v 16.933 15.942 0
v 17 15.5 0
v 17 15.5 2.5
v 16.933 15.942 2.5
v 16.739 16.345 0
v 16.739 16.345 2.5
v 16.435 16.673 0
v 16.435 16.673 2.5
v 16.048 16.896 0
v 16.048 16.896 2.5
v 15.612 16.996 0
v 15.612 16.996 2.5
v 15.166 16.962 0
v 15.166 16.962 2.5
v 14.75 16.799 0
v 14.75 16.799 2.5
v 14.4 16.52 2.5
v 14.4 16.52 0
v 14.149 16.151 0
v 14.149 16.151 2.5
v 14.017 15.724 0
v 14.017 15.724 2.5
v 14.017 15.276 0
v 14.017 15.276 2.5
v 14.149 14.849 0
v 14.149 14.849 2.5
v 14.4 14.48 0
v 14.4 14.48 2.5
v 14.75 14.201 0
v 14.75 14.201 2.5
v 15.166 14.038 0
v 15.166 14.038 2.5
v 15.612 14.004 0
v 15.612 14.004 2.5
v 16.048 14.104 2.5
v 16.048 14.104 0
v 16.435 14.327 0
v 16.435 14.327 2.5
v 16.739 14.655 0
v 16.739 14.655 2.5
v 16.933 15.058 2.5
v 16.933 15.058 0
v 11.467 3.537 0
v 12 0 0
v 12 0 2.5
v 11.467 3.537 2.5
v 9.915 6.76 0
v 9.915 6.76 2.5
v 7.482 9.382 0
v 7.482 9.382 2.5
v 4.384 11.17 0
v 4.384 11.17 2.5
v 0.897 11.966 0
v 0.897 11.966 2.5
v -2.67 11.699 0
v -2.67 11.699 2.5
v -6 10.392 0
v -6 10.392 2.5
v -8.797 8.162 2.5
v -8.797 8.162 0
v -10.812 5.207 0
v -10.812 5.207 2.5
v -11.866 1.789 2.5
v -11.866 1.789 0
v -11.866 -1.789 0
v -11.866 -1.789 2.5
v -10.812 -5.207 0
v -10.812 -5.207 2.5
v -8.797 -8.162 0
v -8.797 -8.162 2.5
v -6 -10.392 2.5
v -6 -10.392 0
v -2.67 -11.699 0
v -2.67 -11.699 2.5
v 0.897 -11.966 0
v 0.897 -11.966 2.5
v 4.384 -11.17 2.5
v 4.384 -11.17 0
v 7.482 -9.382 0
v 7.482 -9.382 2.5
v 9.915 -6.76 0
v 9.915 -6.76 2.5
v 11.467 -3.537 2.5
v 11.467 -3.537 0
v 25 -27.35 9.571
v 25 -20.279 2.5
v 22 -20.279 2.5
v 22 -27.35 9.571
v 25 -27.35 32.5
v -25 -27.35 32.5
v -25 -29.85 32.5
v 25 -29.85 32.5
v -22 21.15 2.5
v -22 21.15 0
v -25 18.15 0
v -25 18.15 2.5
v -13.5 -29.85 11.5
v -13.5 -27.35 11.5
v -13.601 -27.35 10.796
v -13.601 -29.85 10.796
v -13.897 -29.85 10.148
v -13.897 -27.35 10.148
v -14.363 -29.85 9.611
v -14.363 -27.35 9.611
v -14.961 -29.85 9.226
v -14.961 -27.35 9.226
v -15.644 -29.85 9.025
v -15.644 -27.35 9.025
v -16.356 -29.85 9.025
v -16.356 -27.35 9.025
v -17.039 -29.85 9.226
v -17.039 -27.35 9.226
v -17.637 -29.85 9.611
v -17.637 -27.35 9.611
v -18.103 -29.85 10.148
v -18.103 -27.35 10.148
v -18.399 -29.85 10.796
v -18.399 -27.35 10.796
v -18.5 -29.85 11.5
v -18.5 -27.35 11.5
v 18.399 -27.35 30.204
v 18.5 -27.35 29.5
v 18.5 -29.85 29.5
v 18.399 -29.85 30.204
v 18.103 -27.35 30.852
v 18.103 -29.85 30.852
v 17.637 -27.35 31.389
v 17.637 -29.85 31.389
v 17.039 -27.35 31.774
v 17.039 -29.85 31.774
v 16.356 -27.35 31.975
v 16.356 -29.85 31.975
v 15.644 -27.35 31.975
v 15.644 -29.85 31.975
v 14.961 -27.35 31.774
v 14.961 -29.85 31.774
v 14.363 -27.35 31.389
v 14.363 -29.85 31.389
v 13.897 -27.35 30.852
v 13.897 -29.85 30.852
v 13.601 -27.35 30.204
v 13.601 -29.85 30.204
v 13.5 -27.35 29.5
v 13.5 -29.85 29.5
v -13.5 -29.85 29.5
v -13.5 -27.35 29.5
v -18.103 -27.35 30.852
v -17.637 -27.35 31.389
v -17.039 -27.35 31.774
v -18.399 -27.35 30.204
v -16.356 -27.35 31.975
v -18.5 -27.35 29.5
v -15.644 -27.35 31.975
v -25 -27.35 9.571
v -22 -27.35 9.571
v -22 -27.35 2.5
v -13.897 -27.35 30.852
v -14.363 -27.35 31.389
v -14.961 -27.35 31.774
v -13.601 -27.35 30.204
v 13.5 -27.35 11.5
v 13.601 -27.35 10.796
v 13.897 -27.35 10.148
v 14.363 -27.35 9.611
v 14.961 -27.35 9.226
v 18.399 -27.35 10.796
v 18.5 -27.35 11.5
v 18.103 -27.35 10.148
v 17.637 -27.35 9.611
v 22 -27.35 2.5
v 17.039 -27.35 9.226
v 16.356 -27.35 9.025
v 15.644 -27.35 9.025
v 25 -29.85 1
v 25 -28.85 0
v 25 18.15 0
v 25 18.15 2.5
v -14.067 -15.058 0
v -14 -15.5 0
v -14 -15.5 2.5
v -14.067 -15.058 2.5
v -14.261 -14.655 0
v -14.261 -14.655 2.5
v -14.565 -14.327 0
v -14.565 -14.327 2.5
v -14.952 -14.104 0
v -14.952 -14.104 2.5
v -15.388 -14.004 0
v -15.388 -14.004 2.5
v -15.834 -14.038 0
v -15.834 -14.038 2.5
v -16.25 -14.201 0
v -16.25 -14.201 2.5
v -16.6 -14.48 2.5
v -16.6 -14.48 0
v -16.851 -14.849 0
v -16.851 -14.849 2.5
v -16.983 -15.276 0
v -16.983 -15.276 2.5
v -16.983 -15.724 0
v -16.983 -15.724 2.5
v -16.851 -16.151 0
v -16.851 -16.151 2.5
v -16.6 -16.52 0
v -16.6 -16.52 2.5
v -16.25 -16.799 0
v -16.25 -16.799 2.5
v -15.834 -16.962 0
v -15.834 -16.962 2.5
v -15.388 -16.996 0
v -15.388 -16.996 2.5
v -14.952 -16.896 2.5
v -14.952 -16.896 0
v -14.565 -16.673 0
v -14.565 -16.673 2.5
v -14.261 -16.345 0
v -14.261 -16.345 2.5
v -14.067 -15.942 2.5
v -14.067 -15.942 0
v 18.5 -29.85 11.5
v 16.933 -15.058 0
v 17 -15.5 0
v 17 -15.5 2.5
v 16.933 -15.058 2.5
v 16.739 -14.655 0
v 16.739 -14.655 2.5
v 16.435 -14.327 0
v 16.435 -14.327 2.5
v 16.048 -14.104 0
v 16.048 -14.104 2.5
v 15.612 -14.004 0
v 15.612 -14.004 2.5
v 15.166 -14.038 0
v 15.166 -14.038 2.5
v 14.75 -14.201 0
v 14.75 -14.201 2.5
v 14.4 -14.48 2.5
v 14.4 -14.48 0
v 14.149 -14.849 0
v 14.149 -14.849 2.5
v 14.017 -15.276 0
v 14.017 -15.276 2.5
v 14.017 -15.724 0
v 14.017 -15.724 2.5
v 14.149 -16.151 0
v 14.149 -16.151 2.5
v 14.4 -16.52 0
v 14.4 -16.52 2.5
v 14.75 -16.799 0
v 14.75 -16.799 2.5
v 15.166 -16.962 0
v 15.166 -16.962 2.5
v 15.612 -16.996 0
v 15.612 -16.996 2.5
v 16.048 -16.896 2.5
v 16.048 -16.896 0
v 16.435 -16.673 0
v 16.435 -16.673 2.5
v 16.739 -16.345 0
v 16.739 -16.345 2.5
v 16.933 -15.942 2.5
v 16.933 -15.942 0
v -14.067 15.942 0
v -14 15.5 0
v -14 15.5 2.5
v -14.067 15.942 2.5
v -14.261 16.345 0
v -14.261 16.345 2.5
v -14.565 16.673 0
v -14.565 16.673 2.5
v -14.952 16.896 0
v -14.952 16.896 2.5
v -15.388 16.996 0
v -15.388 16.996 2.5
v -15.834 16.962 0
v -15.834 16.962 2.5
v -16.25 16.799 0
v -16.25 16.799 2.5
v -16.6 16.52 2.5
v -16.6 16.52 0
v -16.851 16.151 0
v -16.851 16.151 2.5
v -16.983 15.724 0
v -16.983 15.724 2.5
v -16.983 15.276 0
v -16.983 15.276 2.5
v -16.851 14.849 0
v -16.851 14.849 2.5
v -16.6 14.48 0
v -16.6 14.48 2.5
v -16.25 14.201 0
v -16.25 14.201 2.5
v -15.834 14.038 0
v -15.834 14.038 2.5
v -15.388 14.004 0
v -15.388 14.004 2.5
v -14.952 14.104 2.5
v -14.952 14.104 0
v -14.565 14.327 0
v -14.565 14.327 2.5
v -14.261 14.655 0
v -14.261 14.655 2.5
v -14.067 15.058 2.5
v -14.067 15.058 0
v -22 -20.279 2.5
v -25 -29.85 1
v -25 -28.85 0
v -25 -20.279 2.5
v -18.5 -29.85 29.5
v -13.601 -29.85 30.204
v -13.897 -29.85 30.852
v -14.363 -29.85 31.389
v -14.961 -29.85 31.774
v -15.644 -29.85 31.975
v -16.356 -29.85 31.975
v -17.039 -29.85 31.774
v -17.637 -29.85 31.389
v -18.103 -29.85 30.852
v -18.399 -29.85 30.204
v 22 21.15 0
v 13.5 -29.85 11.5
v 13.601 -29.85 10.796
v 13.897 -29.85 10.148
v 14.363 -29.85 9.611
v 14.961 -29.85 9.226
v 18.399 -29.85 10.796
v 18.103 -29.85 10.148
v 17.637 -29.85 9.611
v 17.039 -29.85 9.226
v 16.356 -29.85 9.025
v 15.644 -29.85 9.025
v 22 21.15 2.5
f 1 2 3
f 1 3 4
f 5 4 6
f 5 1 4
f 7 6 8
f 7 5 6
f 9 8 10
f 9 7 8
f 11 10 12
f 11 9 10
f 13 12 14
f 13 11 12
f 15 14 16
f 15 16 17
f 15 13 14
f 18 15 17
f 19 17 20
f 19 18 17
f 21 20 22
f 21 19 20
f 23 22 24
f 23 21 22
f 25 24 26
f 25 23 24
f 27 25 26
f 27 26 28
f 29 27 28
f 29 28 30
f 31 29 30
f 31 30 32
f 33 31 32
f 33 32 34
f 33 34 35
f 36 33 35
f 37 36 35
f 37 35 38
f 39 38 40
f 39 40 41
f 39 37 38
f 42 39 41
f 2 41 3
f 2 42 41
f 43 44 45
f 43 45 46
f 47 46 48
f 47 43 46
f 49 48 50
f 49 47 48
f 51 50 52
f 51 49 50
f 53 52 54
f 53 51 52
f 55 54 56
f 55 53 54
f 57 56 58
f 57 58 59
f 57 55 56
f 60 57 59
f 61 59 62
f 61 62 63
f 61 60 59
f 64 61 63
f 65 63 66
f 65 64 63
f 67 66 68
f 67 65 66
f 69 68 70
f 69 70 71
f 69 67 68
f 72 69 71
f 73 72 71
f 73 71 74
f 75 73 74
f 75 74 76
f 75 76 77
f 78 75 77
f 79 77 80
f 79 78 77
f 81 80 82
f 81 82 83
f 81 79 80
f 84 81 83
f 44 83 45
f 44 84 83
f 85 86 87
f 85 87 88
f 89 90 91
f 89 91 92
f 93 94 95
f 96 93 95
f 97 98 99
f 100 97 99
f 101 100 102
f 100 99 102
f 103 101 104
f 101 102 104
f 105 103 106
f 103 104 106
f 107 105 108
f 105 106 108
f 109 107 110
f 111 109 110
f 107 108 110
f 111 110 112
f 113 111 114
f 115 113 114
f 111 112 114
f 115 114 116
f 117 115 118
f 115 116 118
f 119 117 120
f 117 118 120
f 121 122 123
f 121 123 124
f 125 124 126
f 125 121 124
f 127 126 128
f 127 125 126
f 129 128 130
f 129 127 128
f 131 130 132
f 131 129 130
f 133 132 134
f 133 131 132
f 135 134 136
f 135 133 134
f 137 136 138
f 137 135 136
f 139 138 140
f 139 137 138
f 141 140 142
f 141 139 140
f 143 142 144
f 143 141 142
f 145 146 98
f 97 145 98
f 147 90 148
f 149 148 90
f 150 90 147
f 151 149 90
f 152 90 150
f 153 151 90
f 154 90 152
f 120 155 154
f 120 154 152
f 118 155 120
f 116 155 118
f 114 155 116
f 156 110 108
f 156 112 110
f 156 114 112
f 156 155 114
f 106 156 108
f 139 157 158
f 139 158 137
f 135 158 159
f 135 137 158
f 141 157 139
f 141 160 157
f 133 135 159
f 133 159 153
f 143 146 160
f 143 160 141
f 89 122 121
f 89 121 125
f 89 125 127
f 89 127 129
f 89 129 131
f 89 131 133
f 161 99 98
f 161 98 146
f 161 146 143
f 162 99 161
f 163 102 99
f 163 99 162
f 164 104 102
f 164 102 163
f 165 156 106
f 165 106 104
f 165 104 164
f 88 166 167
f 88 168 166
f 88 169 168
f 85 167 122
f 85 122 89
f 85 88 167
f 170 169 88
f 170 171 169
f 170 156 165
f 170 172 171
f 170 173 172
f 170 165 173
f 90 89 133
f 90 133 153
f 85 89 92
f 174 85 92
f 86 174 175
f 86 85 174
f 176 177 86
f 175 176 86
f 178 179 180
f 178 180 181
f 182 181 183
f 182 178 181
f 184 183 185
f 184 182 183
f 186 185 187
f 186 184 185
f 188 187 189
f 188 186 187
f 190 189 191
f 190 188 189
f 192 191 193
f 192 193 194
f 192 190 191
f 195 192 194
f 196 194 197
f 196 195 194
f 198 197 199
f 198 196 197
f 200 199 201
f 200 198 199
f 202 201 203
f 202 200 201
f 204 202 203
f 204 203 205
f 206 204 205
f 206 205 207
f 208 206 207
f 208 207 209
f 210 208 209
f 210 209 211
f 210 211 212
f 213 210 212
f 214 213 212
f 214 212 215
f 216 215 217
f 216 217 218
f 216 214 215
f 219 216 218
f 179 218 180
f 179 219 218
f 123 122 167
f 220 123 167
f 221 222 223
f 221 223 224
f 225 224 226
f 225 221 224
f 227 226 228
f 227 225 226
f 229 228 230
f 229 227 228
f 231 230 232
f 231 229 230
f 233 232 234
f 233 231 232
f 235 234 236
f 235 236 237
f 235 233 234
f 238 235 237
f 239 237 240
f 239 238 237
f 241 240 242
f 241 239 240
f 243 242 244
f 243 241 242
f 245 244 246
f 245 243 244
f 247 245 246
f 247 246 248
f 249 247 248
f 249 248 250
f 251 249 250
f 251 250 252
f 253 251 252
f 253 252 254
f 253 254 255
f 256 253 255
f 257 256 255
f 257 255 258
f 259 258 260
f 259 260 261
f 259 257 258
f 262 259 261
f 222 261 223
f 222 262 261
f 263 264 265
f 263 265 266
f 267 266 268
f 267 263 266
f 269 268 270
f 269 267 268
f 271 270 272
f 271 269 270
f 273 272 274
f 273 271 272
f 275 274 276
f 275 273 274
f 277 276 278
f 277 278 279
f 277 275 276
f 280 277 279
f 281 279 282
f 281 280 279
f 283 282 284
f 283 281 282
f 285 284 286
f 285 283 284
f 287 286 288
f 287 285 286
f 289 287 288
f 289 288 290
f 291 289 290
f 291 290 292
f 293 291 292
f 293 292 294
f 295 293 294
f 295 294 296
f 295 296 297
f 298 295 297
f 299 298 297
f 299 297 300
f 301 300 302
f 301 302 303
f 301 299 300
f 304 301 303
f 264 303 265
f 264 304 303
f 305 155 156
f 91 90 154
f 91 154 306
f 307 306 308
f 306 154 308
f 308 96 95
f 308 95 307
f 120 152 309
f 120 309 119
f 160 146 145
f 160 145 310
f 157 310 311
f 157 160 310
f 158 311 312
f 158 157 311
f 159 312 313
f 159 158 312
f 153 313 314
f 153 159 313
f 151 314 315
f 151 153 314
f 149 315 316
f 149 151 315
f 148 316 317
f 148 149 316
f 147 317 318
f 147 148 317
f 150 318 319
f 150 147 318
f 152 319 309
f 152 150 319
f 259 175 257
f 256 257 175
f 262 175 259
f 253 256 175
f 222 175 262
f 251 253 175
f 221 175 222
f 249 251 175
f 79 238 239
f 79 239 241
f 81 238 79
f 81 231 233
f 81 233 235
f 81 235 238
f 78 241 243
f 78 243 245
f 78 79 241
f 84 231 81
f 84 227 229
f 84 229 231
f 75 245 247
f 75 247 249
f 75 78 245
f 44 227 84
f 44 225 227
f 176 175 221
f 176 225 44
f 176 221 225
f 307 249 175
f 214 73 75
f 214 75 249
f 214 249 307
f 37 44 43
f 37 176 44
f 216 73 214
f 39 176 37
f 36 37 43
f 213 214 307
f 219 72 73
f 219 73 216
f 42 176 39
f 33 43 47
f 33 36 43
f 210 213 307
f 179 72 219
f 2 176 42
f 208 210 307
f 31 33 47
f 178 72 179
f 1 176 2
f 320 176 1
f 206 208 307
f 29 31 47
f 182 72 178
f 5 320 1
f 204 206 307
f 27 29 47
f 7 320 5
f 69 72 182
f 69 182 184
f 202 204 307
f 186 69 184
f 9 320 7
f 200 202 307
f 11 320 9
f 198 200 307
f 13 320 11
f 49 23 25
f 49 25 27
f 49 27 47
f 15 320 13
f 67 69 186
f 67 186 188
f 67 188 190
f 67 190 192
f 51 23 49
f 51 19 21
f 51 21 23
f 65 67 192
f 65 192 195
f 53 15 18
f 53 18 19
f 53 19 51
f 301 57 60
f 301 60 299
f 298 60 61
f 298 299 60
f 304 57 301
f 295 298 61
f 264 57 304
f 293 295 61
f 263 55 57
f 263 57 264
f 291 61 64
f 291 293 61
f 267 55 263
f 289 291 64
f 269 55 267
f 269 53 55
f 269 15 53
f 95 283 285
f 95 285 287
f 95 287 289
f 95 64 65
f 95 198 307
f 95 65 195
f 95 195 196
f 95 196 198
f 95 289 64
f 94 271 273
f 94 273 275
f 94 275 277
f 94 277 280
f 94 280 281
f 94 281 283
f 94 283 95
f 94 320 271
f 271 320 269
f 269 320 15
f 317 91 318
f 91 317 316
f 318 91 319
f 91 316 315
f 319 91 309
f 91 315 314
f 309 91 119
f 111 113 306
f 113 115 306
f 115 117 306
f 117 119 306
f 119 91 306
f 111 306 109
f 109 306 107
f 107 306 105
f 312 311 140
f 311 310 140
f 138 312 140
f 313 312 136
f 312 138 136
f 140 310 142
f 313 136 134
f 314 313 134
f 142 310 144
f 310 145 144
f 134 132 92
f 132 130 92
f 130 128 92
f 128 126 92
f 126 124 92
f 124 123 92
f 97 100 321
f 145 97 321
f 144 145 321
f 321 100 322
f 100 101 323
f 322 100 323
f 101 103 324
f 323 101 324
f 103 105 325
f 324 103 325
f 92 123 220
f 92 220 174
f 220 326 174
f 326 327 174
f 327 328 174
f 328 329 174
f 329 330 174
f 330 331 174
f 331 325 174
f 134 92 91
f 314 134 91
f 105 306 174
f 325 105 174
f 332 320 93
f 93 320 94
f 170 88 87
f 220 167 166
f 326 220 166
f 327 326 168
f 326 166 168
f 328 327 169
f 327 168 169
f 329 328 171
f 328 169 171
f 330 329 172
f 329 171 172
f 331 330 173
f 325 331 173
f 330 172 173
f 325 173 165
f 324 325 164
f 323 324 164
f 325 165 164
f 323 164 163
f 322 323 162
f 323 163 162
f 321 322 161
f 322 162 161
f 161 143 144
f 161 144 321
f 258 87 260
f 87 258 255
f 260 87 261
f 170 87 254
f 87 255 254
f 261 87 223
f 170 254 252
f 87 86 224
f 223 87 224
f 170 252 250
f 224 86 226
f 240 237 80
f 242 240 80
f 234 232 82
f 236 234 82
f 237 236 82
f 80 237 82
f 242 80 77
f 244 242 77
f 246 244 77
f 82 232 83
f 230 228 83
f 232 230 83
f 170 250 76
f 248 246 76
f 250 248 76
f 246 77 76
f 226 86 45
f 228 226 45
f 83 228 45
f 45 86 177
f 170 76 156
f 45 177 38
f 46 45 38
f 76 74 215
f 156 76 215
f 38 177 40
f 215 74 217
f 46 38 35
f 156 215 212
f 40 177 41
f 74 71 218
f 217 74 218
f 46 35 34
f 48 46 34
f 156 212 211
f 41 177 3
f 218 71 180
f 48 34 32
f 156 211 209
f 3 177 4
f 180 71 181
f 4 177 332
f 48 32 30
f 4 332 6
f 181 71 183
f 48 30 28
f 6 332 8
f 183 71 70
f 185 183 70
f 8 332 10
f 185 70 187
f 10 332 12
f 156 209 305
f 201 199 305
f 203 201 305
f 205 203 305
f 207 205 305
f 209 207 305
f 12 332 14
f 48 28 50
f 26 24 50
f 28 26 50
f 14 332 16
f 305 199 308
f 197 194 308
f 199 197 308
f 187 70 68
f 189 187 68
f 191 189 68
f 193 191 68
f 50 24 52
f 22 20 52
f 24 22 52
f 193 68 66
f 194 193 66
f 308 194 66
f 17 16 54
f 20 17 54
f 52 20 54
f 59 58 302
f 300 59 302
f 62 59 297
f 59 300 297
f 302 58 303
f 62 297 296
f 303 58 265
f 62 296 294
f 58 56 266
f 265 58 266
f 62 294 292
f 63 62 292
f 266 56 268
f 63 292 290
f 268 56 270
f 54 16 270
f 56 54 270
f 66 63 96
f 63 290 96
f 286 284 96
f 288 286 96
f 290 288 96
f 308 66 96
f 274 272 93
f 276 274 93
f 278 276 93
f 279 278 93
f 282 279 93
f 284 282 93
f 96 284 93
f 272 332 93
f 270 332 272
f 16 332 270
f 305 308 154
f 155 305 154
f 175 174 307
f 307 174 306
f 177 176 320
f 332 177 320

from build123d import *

# Parameters (mm, degrees)
SKETCH1_R           = 12
SKETCH1_R_2         = 1.5
BOSS_EXTRUDE1_DEPTH = 2.5
BOSS_EXTRUDE2_DEPTH = 2.5
SKETCH3_W           = 50
SKETCH3_H           = 2.5
BOSS_EXTRUDE3_DEPTH = 30
SKETCH4_W           = 5
SKETCH4_H           = 18
CUT_EXTRUDE1_DEPTH  = 3.5
BOSS_EXTRUDE4_DEPTH = 3
CHAMFER1_SIZE       = 1


with BuildPart() as part:
    # Sketch1 → Boss-Extrude1 (new body)
    with BuildSketch(Plane.XY):
        Polygon((25, 18.15), (22, 21.15), (-22, 21.15), (-25, 18.15), (-25, -23.85), (-22, -26.85), (22, -26.85), (25, -23.85), align=None)
        Circle(SKETCH1_R, mode=Mode.SUBTRACT)
        with Locations((-15.5, 15.5)):
            Circle(SKETCH1_R_2, mode=Mode.SUBTRACT)
        with Locations((15.5, 15.5)):
            Circle(SKETCH1_R_2, mode=Mode.SUBTRACT)
        with Locations((-15.5, -15.5)):
            Circle(SKETCH1_R_2, mode=Mode.SUBTRACT)
        with Locations((15.5, -15.5)):
            Circle(SKETCH1_R_2, mode=Mode.SUBTRACT)
    extrude(amount=BOSS_EXTRUDE1_DEPTH)

    # Sketch2 → Boss-Extrude2 (add)
    with BuildSketch(Plane(origin=(0, 0, 0), x_dir=(-1, 0, 0), z_dir=(0, 0, -1))):
        Polygon((-25, -23.85), (-25, -29.85), (25, -29.85), (25, -23.85), (22, -26.85), (-22, -26.85), align=None)
    extrude(amount=-BOSS_EXTRUDE2_DEPTH)

    # Sketch3 → Boss-Extrude3 (add)
    with BuildSketch(Plane.XY.offset(2.5)):
        with Locations((0, -28.6)):
            Rectangle(SKETCH3_W, SKETCH3_H)
    extrude(amount=BOSS_EXTRUDE3_DEPTH)

    # Sketch4 → Cut-Extrude1 (cut, through all)
    with BuildSketch(Plane(origin=(0, -27.35, 0), x_dir=(1, 0, 0), z_dir=(0, 1, 0))):
        with BuildLine():
            Line((13.5, -29.5), (18.5, -29.5))
            ThreePointArc((18.5, -29.5), (16, -32), (13.5, -29.5))
        make_face()
        with Locations((16, -20.5)):
            Rectangle(SKETCH4_W, SKETCH4_H)
        with BuildLine():
            Line((13.5, -11.5), (18.5, -11.5))
            ThreePointArc((18.5, -11.5), (16, -9), (13.5, -11.5))
        make_face()
        with BuildLine():
            Line((-18.5, -11.5), (-13.5, -11.5))
            ThreePointArc((-13.5, -11.5), (-16, -9), (-18.5, -11.5))
        make_face()
        with Locations((-16, -20.5)):
            Rectangle(SKETCH4_W, SKETCH4_H)
        with BuildLine():
            ThreePointArc((-13.5, -29.5), (-16, -32), (-18.5, -29.5))
            Line((-18.5, -29.5), (-13.5, -29.5))
        make_face()
    extrude(amount=-CUT_EXTRUDE1_DEPTH, mode=Mode.SUBTRACT)

    # Sketch5 → Boss-Extrude4 (add)
    with BuildSketch(Plane(origin=(25, 0, 0), x_dir=(0, 0, -1), z_dir=(1, 0, 0))):
        Polygon((-2.5, -27.35), (-2.5, -20.278932188), (-9.571067812, -27.35), align=None)
    boss_extrude4 = extrude(amount=-BOSS_EXTRUDE4_DEPTH)

    # Mirror1: Boss-Extrude4 across plane
    add(boss_extrude4.mirror(Plane(origin=(0, 0, 0), x_dir=(0, 0, 1), z_dir=(1, 0, 0))))

    # Chamfer1
    chamfer1_edges = [part.edges().sort_by_distance(p)[0] for p in [
        (0, -29.85, 0),
    ]]
    chamfer(chamfer1_edges, length=CHAMFER1_SIZE)


solid = part.part
